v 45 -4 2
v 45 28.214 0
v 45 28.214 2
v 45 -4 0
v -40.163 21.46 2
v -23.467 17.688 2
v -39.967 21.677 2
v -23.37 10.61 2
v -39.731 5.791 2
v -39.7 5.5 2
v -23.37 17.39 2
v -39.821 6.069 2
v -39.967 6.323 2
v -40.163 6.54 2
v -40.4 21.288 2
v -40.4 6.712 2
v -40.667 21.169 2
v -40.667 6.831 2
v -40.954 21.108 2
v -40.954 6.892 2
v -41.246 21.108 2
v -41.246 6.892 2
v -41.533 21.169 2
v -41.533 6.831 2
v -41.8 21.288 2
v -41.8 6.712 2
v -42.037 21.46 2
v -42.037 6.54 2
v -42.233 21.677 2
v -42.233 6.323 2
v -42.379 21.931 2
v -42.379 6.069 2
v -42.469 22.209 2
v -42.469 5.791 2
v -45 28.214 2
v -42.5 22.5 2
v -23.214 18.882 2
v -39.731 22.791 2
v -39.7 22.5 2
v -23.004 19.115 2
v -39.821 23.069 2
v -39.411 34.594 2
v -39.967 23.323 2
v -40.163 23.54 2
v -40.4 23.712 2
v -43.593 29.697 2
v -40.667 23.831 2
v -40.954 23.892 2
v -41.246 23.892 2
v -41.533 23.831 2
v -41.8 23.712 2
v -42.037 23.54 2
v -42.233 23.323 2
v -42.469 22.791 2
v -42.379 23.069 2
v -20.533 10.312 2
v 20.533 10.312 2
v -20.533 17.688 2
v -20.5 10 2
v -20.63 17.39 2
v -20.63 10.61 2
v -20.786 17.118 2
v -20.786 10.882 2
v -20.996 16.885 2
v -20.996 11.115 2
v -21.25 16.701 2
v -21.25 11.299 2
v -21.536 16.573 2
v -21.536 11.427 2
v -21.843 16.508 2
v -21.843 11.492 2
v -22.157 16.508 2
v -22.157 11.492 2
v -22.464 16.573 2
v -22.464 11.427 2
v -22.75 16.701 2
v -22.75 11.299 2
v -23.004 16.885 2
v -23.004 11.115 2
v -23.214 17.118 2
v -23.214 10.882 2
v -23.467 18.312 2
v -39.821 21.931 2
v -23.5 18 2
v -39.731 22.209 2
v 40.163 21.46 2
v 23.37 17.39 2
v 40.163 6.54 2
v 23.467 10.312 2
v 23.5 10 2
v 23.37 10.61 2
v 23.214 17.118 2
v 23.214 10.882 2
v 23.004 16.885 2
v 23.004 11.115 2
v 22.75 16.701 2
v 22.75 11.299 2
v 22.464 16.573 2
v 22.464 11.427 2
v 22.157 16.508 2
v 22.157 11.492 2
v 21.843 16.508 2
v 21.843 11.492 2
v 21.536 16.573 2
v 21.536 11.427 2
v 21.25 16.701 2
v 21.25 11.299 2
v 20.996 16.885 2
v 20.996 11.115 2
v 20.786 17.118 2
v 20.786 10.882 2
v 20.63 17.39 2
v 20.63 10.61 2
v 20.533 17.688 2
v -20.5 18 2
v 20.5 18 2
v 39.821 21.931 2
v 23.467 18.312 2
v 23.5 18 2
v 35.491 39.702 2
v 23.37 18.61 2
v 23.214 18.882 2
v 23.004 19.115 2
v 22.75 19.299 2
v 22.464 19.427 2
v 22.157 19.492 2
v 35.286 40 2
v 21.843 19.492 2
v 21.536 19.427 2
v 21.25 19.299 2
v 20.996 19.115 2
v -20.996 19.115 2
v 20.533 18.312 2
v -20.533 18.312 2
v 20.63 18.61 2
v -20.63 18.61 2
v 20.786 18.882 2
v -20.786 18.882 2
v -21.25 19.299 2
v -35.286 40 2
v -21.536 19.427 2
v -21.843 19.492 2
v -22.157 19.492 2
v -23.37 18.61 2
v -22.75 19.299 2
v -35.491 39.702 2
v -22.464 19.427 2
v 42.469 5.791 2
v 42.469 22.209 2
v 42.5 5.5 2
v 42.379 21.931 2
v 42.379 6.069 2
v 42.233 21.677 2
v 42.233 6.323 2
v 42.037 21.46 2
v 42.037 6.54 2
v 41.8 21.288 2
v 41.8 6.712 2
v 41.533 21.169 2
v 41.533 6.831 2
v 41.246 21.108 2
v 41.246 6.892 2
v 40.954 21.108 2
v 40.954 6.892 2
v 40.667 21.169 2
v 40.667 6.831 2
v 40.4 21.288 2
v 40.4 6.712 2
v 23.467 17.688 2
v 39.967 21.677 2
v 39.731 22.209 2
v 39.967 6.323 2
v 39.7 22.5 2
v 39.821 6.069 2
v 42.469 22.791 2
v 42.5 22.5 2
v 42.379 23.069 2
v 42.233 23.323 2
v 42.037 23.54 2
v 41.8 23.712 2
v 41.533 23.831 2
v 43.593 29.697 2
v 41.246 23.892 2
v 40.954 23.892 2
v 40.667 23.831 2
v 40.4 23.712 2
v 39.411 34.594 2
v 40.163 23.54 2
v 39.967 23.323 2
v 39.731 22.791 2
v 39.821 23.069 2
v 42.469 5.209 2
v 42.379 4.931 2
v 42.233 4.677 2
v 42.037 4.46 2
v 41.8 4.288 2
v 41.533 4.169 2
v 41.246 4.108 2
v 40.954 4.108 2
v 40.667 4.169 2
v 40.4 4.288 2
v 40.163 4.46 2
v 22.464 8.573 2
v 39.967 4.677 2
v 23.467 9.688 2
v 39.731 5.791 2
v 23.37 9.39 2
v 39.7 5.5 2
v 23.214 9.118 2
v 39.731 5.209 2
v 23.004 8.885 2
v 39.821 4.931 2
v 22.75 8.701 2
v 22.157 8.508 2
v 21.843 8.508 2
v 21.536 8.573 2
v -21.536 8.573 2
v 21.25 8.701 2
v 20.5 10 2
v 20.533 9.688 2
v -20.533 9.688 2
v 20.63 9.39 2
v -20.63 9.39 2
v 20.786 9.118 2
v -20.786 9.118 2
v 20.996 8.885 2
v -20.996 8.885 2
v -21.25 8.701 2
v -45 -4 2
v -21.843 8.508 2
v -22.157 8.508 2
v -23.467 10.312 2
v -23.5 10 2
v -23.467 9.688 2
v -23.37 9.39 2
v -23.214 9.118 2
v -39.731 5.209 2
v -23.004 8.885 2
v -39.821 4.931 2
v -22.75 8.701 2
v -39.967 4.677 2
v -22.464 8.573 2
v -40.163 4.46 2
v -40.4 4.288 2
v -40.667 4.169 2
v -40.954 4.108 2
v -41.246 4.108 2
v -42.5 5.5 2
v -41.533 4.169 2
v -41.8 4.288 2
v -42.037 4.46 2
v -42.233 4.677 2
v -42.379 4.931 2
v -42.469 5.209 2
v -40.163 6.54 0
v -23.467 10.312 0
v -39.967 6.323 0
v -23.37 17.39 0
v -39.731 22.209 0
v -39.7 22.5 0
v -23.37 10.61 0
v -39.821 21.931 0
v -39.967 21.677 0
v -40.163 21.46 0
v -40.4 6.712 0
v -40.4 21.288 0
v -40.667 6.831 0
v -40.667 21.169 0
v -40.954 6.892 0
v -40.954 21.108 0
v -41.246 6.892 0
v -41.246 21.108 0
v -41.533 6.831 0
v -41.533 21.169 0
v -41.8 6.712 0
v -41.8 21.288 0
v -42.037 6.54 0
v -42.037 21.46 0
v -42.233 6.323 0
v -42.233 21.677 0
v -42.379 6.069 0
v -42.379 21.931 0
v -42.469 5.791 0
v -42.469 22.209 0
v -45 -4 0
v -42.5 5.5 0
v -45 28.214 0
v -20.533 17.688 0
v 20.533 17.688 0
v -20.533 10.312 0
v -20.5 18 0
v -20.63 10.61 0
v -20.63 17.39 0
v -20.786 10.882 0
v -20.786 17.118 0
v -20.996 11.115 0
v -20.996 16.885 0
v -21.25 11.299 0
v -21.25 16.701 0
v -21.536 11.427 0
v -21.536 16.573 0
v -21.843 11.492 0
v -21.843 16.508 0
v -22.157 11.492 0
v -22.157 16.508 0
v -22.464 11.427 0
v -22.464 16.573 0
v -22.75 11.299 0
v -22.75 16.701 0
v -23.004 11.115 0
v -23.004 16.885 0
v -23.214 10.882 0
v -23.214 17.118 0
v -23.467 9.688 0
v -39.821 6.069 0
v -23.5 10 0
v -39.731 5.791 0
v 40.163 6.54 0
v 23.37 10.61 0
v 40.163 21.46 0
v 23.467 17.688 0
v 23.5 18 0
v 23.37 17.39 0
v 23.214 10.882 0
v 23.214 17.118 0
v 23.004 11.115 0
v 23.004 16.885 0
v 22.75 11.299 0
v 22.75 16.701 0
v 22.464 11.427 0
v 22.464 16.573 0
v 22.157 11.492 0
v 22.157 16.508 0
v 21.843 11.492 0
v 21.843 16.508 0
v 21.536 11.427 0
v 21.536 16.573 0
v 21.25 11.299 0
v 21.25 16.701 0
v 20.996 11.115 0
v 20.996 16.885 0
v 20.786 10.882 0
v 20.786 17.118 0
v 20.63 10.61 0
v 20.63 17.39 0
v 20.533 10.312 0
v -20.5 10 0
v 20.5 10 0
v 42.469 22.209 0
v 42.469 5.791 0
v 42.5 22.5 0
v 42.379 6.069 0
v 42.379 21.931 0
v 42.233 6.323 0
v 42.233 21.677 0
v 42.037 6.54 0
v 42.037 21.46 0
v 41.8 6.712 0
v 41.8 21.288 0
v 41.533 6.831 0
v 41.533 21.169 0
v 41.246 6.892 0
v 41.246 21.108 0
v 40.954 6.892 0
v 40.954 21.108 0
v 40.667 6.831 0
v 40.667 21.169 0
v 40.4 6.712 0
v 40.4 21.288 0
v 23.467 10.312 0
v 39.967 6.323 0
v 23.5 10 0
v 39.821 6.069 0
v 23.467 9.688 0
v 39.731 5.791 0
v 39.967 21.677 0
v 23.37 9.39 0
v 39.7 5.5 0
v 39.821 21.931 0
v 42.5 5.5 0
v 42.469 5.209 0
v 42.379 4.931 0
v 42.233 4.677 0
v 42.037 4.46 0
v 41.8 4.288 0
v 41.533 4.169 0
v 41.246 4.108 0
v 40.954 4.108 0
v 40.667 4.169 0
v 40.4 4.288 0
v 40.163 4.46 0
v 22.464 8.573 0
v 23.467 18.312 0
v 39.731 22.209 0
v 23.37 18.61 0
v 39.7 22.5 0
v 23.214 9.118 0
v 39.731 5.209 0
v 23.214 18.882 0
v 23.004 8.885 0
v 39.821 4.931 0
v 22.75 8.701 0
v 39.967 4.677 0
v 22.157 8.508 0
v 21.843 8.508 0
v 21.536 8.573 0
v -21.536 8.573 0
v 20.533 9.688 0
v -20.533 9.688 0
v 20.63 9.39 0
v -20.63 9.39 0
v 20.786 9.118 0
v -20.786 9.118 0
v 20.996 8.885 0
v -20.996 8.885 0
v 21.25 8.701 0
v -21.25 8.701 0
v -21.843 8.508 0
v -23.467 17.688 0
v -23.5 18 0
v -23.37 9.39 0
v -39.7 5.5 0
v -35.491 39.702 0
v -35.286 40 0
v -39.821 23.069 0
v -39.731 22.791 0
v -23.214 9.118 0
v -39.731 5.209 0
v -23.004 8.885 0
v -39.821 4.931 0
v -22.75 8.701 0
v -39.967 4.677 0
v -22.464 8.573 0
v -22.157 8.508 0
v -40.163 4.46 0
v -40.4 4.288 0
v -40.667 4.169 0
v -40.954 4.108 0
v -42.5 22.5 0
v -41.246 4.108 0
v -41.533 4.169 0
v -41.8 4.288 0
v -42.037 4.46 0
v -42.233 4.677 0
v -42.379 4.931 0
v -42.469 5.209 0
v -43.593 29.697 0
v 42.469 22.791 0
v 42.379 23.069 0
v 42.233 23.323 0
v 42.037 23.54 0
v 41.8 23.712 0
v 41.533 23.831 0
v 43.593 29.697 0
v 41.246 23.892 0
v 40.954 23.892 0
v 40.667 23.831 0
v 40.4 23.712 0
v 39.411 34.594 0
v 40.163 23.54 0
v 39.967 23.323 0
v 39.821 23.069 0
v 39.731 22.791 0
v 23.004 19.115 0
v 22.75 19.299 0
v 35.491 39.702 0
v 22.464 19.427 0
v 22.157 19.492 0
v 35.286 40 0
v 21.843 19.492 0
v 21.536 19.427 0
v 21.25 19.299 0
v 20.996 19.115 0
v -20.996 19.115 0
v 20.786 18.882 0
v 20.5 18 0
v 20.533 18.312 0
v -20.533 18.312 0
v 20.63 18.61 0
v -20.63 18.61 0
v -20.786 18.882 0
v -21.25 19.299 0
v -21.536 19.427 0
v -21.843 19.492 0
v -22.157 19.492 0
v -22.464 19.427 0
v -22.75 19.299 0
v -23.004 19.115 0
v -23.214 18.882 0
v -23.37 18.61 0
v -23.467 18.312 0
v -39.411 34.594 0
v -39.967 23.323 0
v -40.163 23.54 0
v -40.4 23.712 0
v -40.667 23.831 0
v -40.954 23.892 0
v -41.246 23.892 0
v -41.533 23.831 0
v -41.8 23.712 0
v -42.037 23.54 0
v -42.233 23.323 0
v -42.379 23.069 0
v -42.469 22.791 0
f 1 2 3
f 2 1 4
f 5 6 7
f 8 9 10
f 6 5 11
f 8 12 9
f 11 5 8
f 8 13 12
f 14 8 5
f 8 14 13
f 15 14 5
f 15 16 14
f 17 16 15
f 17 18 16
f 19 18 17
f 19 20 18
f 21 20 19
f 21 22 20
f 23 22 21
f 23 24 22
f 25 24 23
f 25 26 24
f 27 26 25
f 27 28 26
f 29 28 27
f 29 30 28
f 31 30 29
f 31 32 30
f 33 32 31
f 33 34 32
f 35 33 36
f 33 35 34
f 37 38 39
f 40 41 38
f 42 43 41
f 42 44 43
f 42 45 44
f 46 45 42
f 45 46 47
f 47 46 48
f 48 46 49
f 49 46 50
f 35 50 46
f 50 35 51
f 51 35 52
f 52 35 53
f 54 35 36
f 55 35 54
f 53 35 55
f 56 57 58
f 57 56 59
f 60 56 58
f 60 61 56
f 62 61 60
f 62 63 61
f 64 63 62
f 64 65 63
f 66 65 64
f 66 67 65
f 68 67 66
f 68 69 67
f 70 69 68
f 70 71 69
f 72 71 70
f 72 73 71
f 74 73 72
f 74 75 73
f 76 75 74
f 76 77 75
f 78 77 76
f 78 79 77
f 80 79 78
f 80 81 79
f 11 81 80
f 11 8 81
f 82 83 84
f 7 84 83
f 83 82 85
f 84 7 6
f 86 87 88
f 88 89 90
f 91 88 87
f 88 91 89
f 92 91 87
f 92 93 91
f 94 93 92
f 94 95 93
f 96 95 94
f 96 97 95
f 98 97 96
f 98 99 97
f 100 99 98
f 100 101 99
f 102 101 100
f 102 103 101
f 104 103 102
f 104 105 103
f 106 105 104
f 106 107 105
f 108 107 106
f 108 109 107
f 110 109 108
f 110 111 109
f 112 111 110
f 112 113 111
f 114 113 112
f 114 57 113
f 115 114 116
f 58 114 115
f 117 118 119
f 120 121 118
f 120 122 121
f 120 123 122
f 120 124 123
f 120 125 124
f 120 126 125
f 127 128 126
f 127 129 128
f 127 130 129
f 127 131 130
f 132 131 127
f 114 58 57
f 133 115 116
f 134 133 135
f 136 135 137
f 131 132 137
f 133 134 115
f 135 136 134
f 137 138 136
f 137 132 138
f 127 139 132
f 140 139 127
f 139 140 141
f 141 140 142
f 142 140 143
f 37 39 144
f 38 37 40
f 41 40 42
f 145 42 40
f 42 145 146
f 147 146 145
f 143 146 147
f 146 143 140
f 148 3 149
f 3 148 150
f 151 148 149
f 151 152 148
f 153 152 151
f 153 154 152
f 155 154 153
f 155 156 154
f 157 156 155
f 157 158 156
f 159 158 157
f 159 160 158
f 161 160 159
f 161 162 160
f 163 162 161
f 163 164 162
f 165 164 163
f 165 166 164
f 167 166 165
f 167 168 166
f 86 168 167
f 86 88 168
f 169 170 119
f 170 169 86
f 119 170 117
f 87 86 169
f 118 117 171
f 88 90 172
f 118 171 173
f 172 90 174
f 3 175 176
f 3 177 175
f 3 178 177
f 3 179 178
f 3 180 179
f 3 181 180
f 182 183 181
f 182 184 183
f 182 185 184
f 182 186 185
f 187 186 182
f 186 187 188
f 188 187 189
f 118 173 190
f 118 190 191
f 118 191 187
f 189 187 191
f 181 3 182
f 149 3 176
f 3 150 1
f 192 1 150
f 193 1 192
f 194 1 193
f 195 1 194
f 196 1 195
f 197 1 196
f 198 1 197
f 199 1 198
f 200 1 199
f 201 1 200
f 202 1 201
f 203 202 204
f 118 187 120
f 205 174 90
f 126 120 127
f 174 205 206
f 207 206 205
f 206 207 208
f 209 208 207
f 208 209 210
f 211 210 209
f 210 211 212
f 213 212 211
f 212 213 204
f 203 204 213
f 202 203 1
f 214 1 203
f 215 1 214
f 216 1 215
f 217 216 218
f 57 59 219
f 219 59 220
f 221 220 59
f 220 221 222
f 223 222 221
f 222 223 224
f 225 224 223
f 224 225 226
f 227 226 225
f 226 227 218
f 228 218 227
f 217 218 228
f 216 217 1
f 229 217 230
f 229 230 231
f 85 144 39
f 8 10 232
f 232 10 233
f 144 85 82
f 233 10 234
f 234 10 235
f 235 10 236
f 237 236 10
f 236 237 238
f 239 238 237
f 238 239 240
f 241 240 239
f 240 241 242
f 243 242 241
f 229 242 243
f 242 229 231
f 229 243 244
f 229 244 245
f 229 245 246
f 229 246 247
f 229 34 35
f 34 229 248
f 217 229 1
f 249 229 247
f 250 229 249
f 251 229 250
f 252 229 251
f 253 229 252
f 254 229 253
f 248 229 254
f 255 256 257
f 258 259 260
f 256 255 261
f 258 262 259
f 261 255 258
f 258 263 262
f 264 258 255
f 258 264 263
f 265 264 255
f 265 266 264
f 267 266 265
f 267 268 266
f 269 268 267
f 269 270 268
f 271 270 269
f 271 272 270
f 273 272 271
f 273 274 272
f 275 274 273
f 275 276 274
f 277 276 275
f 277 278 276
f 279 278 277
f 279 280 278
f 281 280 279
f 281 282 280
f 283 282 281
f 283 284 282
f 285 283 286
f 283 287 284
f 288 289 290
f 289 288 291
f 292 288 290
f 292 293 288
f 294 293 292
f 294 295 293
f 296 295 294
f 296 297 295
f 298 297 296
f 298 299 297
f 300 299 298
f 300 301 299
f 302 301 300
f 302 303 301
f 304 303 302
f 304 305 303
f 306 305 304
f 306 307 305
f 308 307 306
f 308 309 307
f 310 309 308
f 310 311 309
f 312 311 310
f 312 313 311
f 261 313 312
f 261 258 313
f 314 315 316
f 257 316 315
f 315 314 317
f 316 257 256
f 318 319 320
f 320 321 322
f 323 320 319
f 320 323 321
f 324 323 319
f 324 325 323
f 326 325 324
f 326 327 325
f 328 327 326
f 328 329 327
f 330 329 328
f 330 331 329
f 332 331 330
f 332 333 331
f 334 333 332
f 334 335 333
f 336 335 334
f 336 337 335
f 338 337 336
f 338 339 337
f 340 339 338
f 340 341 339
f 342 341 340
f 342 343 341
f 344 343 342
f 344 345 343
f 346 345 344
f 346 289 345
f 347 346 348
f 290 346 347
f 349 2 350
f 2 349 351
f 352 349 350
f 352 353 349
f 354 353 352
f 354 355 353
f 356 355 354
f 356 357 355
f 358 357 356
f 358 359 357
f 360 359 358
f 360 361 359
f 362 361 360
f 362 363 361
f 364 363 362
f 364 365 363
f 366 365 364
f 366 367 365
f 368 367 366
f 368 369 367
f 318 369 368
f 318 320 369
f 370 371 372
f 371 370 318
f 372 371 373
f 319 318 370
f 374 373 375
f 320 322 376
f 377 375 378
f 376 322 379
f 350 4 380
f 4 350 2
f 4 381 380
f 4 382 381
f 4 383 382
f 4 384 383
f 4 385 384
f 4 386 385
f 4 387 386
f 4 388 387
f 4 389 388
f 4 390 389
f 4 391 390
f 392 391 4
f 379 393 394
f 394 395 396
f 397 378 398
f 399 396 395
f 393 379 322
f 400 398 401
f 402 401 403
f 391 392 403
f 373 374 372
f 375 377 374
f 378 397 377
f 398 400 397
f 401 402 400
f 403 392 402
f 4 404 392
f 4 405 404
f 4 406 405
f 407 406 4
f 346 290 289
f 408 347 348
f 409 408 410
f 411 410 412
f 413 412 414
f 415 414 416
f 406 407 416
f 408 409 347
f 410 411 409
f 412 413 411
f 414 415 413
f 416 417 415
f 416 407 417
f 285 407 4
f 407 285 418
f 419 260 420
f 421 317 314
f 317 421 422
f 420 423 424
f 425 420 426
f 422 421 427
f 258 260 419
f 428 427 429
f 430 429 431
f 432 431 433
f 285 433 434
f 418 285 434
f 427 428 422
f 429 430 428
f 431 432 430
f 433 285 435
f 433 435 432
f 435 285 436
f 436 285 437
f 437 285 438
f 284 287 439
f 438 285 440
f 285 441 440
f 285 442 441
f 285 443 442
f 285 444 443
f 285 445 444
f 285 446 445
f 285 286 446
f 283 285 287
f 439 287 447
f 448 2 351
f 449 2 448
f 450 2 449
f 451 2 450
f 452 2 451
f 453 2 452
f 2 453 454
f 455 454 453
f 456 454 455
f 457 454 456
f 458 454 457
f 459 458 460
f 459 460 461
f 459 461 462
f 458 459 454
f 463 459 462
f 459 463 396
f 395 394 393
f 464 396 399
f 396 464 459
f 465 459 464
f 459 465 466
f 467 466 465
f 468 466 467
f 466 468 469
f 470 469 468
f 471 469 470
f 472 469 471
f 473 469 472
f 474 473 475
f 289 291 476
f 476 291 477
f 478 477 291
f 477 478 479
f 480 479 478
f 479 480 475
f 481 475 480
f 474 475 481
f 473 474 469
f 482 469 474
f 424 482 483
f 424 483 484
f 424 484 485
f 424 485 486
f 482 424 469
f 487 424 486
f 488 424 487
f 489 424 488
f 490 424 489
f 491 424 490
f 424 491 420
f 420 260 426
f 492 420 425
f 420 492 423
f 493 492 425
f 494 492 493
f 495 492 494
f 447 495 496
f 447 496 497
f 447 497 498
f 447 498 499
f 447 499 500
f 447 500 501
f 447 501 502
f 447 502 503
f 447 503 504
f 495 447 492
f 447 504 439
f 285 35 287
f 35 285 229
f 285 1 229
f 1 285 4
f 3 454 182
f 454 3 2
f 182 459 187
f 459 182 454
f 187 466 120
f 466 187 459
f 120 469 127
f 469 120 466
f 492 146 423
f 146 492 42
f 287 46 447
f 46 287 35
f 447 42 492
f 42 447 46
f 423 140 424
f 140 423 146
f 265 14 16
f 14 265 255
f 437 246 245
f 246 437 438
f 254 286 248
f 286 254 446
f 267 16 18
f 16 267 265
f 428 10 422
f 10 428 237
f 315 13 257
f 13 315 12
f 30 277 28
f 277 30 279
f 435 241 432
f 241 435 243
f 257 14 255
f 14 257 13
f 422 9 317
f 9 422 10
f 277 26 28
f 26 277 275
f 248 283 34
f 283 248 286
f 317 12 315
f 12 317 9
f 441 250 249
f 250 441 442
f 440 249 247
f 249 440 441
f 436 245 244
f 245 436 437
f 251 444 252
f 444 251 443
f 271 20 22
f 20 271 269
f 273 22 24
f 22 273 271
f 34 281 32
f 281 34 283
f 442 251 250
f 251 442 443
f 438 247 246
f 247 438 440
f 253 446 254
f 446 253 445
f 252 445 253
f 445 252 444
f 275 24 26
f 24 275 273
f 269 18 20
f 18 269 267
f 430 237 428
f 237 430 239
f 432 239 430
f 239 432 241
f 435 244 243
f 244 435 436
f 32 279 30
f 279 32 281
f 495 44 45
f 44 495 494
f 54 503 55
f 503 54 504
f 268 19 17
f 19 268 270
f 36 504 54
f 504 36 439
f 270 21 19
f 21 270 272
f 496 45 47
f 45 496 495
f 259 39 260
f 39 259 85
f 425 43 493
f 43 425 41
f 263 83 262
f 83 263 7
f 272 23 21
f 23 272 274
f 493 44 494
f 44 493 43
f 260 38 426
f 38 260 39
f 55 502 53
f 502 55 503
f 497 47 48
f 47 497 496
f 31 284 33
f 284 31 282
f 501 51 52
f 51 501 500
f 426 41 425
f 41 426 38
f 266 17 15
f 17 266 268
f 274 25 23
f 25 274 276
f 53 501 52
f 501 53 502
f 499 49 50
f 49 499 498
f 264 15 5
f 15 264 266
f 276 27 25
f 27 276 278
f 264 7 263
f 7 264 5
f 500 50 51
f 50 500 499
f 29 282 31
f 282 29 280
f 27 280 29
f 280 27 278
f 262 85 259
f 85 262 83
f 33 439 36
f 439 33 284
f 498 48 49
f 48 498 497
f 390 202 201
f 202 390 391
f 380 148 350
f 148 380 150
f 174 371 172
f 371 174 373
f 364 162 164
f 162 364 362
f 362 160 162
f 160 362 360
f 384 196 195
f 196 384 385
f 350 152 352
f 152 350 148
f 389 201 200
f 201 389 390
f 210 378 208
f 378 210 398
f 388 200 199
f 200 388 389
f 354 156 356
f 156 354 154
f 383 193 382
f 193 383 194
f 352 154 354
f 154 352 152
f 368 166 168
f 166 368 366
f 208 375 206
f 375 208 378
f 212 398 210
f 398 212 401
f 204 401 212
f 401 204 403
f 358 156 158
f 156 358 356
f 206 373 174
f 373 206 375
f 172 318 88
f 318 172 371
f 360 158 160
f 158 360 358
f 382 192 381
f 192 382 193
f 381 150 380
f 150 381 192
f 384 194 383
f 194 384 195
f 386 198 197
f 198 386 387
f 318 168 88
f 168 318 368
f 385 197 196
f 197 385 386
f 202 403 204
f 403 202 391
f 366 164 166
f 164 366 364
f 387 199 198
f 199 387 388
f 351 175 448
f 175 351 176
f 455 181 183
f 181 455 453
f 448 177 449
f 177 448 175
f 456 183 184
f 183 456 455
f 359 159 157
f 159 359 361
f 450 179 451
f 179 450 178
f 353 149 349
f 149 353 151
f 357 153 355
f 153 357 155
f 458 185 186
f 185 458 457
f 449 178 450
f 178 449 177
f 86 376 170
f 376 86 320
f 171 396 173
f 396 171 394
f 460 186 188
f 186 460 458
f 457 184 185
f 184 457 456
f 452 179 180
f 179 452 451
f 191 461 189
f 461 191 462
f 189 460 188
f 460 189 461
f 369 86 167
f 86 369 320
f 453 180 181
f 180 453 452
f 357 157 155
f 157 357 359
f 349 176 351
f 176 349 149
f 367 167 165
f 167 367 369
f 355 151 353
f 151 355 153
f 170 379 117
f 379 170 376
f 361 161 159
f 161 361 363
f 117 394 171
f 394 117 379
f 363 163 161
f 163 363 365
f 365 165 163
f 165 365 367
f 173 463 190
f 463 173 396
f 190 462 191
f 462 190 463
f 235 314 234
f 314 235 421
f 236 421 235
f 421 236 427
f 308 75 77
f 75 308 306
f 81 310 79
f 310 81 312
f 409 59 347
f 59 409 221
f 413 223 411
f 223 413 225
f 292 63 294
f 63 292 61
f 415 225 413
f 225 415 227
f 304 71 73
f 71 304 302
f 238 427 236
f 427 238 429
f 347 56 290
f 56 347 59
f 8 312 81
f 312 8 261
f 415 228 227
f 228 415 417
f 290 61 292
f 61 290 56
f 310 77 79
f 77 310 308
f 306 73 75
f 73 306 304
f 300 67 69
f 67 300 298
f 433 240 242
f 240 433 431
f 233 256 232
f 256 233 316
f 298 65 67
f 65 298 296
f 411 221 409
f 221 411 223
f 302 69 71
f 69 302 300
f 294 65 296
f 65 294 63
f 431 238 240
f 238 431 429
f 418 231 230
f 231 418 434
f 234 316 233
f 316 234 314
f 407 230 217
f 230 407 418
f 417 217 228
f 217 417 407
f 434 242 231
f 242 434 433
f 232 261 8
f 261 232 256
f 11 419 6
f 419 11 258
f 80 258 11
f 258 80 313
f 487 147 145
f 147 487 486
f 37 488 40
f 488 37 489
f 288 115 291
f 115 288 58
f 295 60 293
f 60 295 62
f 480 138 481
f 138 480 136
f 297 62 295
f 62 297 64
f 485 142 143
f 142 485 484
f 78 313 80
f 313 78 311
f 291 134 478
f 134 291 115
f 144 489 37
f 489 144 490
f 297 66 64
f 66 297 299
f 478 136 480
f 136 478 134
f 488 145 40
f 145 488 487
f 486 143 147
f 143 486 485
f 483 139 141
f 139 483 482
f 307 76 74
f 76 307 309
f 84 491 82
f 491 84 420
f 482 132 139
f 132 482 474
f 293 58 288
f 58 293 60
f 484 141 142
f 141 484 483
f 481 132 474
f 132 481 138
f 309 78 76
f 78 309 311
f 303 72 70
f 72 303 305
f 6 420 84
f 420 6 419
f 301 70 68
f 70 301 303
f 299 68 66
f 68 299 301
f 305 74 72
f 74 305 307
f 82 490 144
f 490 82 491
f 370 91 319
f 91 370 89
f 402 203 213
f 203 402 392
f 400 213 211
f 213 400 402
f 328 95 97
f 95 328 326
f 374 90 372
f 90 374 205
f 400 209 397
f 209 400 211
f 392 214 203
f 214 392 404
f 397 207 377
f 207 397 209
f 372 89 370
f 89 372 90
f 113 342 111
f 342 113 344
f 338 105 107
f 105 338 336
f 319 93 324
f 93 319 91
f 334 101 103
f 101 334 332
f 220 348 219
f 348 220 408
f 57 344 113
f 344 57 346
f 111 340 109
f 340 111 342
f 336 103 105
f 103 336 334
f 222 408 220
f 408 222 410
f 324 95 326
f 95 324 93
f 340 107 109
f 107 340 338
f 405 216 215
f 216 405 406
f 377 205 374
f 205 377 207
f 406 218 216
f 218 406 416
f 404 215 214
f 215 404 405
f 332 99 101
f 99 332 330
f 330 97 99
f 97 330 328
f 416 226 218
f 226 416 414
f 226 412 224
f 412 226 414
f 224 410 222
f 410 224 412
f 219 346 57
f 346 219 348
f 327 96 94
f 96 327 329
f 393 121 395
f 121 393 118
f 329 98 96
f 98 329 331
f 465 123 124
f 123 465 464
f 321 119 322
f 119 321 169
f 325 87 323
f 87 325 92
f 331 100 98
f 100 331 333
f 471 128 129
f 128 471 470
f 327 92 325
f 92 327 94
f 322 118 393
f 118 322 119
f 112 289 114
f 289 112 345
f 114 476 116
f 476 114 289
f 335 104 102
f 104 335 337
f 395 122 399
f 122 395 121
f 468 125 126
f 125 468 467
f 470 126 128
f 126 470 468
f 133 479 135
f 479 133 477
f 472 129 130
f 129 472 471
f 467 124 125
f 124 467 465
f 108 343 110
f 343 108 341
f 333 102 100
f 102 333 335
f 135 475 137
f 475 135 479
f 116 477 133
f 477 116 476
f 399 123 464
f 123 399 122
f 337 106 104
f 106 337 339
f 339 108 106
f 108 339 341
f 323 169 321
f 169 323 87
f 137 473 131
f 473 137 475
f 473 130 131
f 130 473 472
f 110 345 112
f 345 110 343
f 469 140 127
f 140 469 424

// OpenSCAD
$fn=30;

difference(){
translate([-45,-4,0])cube([90,125,2]);

translate([135,112,-1])cylinder(r=123,h=5,$fn=120);
translate([-135,112,-1])cylinder(r=123,h=5,$fn=120);

translate([-41.1,5.5,-1])cylinder(d=2.8,h=8);
translate([-41.1,22.5,-1])cylinder(d=2.8,h=8);
translate([41.1,5.5,-1])cylinder(d=2.8,h=8);
translate([41.1,22.5,-1])cylinder(d=2.8,h=8);     

translate([-22,10,-1])cylinder(d=3,h=8);
translate([-22,18,-1])cylinder(d=3,h=8);
translate([22,10,-1])cylinder(d=3,h=8);
translate([22,18,-1])cylinder(d=3,h=8);

translate([-50,40,-1])cube([100,100,5]);

}
